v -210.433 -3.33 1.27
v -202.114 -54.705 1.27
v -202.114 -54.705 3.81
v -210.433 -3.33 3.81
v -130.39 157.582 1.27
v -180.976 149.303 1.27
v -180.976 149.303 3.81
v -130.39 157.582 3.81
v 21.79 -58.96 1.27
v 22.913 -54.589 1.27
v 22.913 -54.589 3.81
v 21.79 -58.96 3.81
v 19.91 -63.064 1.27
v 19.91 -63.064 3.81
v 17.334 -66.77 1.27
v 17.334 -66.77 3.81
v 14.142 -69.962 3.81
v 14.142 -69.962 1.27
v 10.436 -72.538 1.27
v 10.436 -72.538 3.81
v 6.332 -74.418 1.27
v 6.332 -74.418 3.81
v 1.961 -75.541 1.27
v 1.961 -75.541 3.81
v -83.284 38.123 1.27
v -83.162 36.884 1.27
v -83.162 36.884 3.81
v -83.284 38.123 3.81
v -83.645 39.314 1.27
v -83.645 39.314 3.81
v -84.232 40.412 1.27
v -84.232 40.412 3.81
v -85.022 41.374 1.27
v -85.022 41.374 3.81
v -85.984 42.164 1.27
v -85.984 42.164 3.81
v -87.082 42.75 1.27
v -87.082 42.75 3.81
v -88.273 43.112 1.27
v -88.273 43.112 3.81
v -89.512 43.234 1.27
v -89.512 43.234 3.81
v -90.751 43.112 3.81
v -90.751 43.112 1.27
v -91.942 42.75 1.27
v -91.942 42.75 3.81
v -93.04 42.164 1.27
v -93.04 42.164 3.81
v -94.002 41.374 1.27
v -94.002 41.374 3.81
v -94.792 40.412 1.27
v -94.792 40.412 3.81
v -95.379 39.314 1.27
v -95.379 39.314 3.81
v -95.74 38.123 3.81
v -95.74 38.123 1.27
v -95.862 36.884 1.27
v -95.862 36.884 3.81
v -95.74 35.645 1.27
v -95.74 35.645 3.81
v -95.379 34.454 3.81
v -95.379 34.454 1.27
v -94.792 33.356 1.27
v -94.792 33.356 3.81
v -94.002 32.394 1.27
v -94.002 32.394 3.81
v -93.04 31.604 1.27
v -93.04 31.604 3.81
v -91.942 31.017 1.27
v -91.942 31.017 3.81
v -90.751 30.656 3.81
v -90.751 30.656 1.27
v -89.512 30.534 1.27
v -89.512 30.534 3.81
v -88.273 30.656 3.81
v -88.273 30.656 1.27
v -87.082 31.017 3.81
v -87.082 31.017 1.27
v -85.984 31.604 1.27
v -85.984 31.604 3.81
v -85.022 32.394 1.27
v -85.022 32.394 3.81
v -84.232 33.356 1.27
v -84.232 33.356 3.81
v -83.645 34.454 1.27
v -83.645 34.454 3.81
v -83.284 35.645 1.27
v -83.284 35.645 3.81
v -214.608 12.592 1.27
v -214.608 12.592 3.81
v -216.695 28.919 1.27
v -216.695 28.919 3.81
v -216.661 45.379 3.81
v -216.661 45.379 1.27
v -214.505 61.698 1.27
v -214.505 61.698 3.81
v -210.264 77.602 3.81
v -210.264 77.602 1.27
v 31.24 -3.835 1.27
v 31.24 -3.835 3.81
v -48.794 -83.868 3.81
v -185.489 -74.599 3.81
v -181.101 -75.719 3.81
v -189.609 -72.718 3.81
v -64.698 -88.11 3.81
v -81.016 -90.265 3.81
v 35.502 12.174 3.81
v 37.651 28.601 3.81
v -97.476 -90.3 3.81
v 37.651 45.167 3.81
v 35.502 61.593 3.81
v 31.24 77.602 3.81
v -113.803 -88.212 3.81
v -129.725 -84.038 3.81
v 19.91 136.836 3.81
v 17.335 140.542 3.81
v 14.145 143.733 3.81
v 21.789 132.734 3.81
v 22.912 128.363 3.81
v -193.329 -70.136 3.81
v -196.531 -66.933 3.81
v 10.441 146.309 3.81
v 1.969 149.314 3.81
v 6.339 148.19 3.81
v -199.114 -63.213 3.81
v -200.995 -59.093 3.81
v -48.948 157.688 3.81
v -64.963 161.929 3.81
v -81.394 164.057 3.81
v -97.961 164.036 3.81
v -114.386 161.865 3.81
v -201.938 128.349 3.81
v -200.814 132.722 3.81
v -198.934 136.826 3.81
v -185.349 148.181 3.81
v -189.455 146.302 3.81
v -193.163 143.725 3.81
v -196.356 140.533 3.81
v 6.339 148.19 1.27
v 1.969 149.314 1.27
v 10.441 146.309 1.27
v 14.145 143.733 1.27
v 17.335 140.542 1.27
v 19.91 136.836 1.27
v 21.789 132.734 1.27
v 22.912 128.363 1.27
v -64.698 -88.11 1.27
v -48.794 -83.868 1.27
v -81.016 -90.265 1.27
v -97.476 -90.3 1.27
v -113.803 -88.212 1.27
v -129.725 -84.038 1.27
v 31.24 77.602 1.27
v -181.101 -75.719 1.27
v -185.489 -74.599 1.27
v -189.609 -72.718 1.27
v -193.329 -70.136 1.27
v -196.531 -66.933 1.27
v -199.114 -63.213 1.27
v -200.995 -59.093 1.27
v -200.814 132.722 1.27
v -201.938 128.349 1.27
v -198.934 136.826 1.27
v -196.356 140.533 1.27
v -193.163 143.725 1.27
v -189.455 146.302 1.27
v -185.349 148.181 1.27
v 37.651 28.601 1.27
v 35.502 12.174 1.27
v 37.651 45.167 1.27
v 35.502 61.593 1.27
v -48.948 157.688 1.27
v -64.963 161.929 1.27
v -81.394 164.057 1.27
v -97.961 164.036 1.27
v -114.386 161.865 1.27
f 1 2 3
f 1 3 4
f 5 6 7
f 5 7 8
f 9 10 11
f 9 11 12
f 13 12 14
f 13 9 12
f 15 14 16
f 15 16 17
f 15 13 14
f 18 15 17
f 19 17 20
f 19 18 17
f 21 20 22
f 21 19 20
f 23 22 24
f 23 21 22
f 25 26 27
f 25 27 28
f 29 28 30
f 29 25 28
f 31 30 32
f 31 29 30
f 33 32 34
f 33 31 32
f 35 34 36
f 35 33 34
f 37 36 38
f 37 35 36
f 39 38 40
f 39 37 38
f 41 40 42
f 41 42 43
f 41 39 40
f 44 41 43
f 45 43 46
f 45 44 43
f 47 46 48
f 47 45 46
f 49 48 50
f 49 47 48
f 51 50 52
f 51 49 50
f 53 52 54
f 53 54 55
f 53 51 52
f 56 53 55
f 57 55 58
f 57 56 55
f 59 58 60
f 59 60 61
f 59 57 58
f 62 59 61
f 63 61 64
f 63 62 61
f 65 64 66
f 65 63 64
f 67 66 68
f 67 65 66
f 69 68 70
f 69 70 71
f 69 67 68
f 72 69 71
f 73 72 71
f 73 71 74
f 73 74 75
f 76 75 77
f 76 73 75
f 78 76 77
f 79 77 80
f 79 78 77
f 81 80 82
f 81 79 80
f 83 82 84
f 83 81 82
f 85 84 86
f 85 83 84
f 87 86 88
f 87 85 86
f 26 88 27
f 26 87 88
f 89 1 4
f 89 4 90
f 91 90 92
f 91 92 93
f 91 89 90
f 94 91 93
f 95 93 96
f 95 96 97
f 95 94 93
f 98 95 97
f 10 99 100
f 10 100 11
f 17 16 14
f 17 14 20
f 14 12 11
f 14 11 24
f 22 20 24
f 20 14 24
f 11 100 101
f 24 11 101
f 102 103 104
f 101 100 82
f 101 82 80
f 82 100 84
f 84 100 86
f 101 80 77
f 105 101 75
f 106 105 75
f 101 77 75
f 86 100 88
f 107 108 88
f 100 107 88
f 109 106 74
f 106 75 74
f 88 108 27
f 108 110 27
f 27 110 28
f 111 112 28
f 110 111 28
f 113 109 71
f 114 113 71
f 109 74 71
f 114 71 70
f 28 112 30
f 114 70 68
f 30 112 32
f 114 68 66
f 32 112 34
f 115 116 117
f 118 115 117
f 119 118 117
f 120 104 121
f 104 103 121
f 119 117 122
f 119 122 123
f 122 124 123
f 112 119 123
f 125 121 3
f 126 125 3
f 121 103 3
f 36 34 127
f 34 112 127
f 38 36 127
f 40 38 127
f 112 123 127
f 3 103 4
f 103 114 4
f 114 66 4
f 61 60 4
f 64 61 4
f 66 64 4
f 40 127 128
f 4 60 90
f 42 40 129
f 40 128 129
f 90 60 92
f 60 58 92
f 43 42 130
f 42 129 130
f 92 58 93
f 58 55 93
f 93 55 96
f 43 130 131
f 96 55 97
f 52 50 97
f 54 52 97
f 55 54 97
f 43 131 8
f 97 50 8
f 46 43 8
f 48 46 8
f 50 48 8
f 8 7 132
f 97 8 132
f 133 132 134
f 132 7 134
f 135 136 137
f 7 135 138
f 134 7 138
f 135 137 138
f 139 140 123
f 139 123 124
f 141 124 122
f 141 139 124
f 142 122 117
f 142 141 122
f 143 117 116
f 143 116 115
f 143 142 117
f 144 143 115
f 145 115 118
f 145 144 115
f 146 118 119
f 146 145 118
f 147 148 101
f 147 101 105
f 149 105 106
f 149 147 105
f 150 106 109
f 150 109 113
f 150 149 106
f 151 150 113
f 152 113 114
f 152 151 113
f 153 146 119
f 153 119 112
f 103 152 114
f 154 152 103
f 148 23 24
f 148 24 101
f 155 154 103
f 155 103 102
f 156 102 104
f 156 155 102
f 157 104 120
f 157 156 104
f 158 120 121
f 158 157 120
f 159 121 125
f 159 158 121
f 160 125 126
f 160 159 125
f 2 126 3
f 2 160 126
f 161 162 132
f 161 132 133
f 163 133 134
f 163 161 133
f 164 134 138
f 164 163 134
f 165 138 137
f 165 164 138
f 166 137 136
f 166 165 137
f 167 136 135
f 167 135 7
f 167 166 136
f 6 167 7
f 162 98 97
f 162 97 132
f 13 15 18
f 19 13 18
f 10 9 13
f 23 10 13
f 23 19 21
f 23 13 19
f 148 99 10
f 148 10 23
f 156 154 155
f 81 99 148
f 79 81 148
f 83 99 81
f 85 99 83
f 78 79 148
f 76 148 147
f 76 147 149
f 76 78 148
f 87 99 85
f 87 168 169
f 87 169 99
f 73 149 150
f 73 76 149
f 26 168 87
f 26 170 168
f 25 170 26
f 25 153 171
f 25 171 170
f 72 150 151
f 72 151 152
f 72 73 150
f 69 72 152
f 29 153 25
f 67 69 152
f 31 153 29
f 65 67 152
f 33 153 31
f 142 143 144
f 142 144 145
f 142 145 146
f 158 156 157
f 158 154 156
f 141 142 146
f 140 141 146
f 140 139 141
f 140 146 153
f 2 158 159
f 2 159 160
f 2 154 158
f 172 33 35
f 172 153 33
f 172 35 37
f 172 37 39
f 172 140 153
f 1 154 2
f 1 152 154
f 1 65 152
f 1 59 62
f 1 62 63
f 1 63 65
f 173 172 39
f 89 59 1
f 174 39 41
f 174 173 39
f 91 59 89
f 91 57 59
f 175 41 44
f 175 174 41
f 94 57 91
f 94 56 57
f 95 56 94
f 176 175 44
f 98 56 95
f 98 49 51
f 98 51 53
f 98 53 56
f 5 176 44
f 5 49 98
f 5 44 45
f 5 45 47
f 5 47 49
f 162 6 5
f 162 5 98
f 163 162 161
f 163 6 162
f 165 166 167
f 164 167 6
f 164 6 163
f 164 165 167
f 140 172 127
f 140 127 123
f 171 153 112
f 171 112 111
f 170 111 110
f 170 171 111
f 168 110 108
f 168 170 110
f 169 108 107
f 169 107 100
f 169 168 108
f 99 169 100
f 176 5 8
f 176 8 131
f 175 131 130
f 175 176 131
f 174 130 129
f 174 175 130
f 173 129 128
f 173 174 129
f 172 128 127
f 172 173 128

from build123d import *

# Parameters (mm, degrees)
SKETCH1_R           = 12.7
BOSS_EXTRUDE1_DEPTH = 5.08
SCALE1_SCALE        = 0.5


with BuildPart() as part:
    # Sketch1 → Boss-Extrude1 (new body)
    with BuildSketch(Plane.XY):
        with BuildLine():
            Line((93.467932513, -187.929219557), (-8.040338021, -204.583155787))
            ThreePointArc((-8.040338021, -204.583155787), (-88.944478372, -217.943504644), (-169.903751816, -204.921412232))
            Line((-169.903751816, -204.921412232), (-272.655005044, -188.283976468))
            ThreePointArc((-272.655005044, -188.283976468), (-300.456269849, -174.058121661), (-314.682124657, -146.256856856))
            Line((-314.682124657, -146.256856856), (-331.319560421, -43.505603627))
            ThreePointArc((-331.319560421, -43.505603627), (-344.341652832, 37.453669817), (-330.981303976, 118.357810167))
            Line((-330.981303976, 118.357810167), (-314.329829255, 219.851077431))
            ThreePointArc((-314.329829255, 219.851077431), (-300.11395964, 247.554656272), (-272.404769628, 261.75958564))
            Line((-272.404769628, 261.75958564), (-171.233737428, 278.317171496))
            ThreePointArc((-171.233737428, 278.317171496), (-89.808861292, 291.785970897), (-8.349194575, 278.529209999))
            Line((-8.349194575, 278.529209999), (93.484449571, 261.782540046))
            ThreePointArc((93.484449571, 261.782540046), (121.168832583, 247.570102588), (135.370852074, 219.880373742))
            Line((135.370852074, 219.880373742), (152.027133289, 118.357810167))
            ThreePointArc((152.027133289, 118.357810167), (165.388038657, 36.921062845), (152.027133289, -44.515684477))
            Line((152.027133289, -44.515684477), (135.373197059, -146.023955011))
            ThreePointArc((135.373197059, -146.023955011), (121.164420099, -173.720442597), (93.467932513, -187.929219557))
        make_face()
        with Locations((-89.477085343, 36.921062845)):
            Circle(SKETCH1_R, mode=Mode.SUBTRACT)
    extrude(amount=BOSS_EXTRUDE1_DEPTH)


with BuildPart() as part_1:
    # Scale1: scaled about (-89.546856293, 36.846362698, 2.54)
    add(part.part.scale(SCALE1_SCALE).moved(Location((-44.773428147, 18.423181349, 1.27))))


solid = part_1.part
